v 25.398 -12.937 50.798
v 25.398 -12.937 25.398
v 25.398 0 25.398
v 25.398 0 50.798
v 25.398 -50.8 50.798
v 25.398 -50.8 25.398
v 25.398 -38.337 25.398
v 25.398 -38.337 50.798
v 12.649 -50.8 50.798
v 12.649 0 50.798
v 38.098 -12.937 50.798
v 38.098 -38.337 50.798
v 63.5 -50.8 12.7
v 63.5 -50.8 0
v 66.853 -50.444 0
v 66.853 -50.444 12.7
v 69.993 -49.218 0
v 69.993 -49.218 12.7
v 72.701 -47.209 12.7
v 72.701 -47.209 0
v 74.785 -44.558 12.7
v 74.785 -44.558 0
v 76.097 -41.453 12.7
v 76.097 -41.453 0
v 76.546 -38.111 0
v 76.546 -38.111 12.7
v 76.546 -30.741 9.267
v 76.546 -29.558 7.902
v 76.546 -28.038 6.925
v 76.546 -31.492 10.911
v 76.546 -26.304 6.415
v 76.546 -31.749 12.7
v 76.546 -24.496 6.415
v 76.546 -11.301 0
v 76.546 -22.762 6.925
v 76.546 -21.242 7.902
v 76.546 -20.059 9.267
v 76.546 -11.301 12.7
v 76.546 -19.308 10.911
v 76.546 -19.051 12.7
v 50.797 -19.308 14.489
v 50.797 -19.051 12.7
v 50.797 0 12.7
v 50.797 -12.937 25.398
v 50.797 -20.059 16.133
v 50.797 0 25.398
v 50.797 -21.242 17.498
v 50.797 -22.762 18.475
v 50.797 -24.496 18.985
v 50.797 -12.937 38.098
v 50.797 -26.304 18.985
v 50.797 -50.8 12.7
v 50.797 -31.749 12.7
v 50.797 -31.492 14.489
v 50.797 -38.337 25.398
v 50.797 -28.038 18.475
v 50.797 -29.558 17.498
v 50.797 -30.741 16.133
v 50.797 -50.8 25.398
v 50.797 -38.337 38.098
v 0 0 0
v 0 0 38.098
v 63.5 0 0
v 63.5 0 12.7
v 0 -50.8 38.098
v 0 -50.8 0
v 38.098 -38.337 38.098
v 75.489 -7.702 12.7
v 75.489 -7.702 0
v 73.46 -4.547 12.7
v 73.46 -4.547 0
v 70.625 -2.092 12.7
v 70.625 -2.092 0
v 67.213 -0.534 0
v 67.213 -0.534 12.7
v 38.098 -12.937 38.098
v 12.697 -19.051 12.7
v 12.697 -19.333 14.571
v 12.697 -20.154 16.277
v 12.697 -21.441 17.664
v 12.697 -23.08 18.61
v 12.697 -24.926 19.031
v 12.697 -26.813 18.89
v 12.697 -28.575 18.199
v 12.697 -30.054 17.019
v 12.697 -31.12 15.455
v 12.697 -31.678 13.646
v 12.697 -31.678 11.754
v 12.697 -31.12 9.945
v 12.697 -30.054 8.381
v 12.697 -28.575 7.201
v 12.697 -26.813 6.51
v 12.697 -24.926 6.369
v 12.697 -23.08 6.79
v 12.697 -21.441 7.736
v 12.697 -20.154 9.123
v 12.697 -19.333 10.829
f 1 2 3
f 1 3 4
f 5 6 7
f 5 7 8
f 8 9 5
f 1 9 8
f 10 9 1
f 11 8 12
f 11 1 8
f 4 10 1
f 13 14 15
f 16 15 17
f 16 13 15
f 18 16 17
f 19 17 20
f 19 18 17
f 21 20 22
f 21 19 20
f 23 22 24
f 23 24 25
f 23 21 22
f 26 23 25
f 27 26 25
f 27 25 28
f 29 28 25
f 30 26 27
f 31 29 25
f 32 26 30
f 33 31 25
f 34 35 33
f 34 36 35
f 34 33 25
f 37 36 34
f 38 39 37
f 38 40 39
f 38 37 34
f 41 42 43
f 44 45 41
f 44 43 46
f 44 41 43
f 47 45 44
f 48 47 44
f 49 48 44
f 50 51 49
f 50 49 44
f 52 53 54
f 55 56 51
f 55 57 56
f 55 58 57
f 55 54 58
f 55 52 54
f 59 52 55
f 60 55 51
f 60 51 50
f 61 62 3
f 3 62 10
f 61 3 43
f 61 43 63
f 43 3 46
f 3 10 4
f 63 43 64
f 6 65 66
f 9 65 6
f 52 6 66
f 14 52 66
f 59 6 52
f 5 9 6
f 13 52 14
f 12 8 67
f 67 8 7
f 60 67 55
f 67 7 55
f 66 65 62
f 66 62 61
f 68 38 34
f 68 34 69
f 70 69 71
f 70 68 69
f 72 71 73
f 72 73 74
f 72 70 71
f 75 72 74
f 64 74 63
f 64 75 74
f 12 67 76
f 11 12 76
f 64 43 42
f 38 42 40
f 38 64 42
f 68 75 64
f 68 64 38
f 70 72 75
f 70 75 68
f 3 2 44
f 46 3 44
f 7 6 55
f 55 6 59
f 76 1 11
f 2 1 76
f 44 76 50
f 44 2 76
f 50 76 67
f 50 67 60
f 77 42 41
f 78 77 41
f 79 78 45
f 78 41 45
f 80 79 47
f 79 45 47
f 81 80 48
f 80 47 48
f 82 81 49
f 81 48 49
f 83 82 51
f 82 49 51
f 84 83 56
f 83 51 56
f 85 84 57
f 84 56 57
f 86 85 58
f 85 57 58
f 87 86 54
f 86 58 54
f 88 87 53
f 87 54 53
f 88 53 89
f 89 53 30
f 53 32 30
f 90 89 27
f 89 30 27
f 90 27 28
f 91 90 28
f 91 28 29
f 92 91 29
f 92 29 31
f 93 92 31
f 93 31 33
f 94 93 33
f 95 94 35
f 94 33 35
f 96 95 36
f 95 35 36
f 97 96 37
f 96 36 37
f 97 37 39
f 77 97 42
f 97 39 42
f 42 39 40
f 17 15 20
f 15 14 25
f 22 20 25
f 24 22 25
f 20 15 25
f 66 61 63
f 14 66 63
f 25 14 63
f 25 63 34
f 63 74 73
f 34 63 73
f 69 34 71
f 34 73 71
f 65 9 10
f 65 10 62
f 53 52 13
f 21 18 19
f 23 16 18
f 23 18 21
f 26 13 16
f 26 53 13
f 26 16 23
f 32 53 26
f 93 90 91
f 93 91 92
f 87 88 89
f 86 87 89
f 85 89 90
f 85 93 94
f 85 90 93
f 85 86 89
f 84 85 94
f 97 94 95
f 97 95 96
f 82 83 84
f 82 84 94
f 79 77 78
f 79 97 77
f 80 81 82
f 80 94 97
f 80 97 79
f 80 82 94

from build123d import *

# Parameters (mm, degrees)
F0_W      = 63.5
F0_H      = 12.7
F1_DEPTH  = 50.8
F2_W      = 50.7968105376
F2_H      = 12.6984052688
F3_DEPTH  = 50.8
F5_DEPTH  = 50.8
F6_W      = 25.3984052688
F6_H      = 25.4
F7_DEPTH  = 12.7
F8_W      = 12.6992026344
F8_H      = 25.4
F9_DEPTH  = 12.7
F10_W     = 13.0463411808
F10_H     = 26.8100267276
F11_DEPTH = 12.7
F13_DEPTH = 12.7
F15_DEPTH = 12.7
F16_R     = 6.3492026344
F17_DEPTH = 38.1


with BuildPart() as f1:
    # F0 (on Front) → F1 (new body)
    with BuildSketch(Plane.XZ):
        with Locations((31.75, 6.35)):
            Rectangle(F0_W, F0_H)
    extrude(amount=F1_DEPTH)

    # F2 (on face) → F3 (join)
    with BuildSketch(Plane.XZ.offset(50.8)):
        with Locations((25.3984052688, 19.0492026344)):
            Rectangle(F2_W, F2_H)
    extrude(amount=-F3_DEPTH)

    # F4 (on face) → F5 (join)
    with BuildSketch(Plane.XZ.offset(50.8)):
        Polygon((0, 38.0984052688), (0, 25.3984052688), (25.3984052688, 25.3984052688), (25.3984052688, 50.7984052688), (12.6490090042, 50.7984052688), align=None)
    extrude(amount=-F5_DEPTH)

    # F6 (on face) → F7 (join)
    with BuildSketch(Plane.XY.offset(25.3984052688)):
        with Locations((38.0976079032, -25.6369028568)):
            Rectangle(F6_W, F6_H)
    extrude(amount=F7_DEPTH)

    # F8 (on face) → F9 (join)
    with BuildSketch(Plane.XY.offset(38.0984052688)):
        with Locations((31.748006586, -25.6369028568)):
            Rectangle(F8_W, F8_H)
    extrude(amount=F9_DEPTH)

    # F10 (on face) → F11 (join)
    with BuildSketch(Plane.XY.offset(12.7)):
        with Locations((70.0231705904, -24.706099648)):
            Rectangle(F10_W, F10_H)
    extrude(amount=-F11_DEPTH)

    # F12 (on face) → F13 (join)
    with BuildSketch(Plane.XY.offset(12.7)):
        with BuildLine():
            Line((63.5, -11.3010862842), (76.5463411808, -11.3010862842))
            ThreePointArc((76.5463411808, -11.3010862842), (72.1302023355, -3.2181172377), (63.5, 0))
            Line((63.5, 0), (63.5, -11.3010862842))
        make_face()
    extrude(amount=-F13_DEPTH)

    # F14 (on face) → F15 (join)
    with BuildSketch(Plane.XY.offset(12.7)):
        with BuildLine():
            Line((63.5, -38.1111130118), (63.5, -50.8))
            ThreePointArc((63.5, -50.8), (72.7010118925, -47.2088343378), (76.5463411808, -38.1111130118))
            Line((76.5463411808, -38.1111130118), (63.5, -38.1111130118))
        make_face()
    extrude(amount=-F15_DEPTH)

    # F16 (on face) → F17 (cut, symmetric)
    with BuildSketch(Plane.YZ.offset(50.7968105376)):
        with Locations((-25.4, 12.7)):
            Circle(F16_R)
    extrude(amount=F17_DEPTH, both=True, mode=Mode.SUBTRACT)


solid = f1.part
